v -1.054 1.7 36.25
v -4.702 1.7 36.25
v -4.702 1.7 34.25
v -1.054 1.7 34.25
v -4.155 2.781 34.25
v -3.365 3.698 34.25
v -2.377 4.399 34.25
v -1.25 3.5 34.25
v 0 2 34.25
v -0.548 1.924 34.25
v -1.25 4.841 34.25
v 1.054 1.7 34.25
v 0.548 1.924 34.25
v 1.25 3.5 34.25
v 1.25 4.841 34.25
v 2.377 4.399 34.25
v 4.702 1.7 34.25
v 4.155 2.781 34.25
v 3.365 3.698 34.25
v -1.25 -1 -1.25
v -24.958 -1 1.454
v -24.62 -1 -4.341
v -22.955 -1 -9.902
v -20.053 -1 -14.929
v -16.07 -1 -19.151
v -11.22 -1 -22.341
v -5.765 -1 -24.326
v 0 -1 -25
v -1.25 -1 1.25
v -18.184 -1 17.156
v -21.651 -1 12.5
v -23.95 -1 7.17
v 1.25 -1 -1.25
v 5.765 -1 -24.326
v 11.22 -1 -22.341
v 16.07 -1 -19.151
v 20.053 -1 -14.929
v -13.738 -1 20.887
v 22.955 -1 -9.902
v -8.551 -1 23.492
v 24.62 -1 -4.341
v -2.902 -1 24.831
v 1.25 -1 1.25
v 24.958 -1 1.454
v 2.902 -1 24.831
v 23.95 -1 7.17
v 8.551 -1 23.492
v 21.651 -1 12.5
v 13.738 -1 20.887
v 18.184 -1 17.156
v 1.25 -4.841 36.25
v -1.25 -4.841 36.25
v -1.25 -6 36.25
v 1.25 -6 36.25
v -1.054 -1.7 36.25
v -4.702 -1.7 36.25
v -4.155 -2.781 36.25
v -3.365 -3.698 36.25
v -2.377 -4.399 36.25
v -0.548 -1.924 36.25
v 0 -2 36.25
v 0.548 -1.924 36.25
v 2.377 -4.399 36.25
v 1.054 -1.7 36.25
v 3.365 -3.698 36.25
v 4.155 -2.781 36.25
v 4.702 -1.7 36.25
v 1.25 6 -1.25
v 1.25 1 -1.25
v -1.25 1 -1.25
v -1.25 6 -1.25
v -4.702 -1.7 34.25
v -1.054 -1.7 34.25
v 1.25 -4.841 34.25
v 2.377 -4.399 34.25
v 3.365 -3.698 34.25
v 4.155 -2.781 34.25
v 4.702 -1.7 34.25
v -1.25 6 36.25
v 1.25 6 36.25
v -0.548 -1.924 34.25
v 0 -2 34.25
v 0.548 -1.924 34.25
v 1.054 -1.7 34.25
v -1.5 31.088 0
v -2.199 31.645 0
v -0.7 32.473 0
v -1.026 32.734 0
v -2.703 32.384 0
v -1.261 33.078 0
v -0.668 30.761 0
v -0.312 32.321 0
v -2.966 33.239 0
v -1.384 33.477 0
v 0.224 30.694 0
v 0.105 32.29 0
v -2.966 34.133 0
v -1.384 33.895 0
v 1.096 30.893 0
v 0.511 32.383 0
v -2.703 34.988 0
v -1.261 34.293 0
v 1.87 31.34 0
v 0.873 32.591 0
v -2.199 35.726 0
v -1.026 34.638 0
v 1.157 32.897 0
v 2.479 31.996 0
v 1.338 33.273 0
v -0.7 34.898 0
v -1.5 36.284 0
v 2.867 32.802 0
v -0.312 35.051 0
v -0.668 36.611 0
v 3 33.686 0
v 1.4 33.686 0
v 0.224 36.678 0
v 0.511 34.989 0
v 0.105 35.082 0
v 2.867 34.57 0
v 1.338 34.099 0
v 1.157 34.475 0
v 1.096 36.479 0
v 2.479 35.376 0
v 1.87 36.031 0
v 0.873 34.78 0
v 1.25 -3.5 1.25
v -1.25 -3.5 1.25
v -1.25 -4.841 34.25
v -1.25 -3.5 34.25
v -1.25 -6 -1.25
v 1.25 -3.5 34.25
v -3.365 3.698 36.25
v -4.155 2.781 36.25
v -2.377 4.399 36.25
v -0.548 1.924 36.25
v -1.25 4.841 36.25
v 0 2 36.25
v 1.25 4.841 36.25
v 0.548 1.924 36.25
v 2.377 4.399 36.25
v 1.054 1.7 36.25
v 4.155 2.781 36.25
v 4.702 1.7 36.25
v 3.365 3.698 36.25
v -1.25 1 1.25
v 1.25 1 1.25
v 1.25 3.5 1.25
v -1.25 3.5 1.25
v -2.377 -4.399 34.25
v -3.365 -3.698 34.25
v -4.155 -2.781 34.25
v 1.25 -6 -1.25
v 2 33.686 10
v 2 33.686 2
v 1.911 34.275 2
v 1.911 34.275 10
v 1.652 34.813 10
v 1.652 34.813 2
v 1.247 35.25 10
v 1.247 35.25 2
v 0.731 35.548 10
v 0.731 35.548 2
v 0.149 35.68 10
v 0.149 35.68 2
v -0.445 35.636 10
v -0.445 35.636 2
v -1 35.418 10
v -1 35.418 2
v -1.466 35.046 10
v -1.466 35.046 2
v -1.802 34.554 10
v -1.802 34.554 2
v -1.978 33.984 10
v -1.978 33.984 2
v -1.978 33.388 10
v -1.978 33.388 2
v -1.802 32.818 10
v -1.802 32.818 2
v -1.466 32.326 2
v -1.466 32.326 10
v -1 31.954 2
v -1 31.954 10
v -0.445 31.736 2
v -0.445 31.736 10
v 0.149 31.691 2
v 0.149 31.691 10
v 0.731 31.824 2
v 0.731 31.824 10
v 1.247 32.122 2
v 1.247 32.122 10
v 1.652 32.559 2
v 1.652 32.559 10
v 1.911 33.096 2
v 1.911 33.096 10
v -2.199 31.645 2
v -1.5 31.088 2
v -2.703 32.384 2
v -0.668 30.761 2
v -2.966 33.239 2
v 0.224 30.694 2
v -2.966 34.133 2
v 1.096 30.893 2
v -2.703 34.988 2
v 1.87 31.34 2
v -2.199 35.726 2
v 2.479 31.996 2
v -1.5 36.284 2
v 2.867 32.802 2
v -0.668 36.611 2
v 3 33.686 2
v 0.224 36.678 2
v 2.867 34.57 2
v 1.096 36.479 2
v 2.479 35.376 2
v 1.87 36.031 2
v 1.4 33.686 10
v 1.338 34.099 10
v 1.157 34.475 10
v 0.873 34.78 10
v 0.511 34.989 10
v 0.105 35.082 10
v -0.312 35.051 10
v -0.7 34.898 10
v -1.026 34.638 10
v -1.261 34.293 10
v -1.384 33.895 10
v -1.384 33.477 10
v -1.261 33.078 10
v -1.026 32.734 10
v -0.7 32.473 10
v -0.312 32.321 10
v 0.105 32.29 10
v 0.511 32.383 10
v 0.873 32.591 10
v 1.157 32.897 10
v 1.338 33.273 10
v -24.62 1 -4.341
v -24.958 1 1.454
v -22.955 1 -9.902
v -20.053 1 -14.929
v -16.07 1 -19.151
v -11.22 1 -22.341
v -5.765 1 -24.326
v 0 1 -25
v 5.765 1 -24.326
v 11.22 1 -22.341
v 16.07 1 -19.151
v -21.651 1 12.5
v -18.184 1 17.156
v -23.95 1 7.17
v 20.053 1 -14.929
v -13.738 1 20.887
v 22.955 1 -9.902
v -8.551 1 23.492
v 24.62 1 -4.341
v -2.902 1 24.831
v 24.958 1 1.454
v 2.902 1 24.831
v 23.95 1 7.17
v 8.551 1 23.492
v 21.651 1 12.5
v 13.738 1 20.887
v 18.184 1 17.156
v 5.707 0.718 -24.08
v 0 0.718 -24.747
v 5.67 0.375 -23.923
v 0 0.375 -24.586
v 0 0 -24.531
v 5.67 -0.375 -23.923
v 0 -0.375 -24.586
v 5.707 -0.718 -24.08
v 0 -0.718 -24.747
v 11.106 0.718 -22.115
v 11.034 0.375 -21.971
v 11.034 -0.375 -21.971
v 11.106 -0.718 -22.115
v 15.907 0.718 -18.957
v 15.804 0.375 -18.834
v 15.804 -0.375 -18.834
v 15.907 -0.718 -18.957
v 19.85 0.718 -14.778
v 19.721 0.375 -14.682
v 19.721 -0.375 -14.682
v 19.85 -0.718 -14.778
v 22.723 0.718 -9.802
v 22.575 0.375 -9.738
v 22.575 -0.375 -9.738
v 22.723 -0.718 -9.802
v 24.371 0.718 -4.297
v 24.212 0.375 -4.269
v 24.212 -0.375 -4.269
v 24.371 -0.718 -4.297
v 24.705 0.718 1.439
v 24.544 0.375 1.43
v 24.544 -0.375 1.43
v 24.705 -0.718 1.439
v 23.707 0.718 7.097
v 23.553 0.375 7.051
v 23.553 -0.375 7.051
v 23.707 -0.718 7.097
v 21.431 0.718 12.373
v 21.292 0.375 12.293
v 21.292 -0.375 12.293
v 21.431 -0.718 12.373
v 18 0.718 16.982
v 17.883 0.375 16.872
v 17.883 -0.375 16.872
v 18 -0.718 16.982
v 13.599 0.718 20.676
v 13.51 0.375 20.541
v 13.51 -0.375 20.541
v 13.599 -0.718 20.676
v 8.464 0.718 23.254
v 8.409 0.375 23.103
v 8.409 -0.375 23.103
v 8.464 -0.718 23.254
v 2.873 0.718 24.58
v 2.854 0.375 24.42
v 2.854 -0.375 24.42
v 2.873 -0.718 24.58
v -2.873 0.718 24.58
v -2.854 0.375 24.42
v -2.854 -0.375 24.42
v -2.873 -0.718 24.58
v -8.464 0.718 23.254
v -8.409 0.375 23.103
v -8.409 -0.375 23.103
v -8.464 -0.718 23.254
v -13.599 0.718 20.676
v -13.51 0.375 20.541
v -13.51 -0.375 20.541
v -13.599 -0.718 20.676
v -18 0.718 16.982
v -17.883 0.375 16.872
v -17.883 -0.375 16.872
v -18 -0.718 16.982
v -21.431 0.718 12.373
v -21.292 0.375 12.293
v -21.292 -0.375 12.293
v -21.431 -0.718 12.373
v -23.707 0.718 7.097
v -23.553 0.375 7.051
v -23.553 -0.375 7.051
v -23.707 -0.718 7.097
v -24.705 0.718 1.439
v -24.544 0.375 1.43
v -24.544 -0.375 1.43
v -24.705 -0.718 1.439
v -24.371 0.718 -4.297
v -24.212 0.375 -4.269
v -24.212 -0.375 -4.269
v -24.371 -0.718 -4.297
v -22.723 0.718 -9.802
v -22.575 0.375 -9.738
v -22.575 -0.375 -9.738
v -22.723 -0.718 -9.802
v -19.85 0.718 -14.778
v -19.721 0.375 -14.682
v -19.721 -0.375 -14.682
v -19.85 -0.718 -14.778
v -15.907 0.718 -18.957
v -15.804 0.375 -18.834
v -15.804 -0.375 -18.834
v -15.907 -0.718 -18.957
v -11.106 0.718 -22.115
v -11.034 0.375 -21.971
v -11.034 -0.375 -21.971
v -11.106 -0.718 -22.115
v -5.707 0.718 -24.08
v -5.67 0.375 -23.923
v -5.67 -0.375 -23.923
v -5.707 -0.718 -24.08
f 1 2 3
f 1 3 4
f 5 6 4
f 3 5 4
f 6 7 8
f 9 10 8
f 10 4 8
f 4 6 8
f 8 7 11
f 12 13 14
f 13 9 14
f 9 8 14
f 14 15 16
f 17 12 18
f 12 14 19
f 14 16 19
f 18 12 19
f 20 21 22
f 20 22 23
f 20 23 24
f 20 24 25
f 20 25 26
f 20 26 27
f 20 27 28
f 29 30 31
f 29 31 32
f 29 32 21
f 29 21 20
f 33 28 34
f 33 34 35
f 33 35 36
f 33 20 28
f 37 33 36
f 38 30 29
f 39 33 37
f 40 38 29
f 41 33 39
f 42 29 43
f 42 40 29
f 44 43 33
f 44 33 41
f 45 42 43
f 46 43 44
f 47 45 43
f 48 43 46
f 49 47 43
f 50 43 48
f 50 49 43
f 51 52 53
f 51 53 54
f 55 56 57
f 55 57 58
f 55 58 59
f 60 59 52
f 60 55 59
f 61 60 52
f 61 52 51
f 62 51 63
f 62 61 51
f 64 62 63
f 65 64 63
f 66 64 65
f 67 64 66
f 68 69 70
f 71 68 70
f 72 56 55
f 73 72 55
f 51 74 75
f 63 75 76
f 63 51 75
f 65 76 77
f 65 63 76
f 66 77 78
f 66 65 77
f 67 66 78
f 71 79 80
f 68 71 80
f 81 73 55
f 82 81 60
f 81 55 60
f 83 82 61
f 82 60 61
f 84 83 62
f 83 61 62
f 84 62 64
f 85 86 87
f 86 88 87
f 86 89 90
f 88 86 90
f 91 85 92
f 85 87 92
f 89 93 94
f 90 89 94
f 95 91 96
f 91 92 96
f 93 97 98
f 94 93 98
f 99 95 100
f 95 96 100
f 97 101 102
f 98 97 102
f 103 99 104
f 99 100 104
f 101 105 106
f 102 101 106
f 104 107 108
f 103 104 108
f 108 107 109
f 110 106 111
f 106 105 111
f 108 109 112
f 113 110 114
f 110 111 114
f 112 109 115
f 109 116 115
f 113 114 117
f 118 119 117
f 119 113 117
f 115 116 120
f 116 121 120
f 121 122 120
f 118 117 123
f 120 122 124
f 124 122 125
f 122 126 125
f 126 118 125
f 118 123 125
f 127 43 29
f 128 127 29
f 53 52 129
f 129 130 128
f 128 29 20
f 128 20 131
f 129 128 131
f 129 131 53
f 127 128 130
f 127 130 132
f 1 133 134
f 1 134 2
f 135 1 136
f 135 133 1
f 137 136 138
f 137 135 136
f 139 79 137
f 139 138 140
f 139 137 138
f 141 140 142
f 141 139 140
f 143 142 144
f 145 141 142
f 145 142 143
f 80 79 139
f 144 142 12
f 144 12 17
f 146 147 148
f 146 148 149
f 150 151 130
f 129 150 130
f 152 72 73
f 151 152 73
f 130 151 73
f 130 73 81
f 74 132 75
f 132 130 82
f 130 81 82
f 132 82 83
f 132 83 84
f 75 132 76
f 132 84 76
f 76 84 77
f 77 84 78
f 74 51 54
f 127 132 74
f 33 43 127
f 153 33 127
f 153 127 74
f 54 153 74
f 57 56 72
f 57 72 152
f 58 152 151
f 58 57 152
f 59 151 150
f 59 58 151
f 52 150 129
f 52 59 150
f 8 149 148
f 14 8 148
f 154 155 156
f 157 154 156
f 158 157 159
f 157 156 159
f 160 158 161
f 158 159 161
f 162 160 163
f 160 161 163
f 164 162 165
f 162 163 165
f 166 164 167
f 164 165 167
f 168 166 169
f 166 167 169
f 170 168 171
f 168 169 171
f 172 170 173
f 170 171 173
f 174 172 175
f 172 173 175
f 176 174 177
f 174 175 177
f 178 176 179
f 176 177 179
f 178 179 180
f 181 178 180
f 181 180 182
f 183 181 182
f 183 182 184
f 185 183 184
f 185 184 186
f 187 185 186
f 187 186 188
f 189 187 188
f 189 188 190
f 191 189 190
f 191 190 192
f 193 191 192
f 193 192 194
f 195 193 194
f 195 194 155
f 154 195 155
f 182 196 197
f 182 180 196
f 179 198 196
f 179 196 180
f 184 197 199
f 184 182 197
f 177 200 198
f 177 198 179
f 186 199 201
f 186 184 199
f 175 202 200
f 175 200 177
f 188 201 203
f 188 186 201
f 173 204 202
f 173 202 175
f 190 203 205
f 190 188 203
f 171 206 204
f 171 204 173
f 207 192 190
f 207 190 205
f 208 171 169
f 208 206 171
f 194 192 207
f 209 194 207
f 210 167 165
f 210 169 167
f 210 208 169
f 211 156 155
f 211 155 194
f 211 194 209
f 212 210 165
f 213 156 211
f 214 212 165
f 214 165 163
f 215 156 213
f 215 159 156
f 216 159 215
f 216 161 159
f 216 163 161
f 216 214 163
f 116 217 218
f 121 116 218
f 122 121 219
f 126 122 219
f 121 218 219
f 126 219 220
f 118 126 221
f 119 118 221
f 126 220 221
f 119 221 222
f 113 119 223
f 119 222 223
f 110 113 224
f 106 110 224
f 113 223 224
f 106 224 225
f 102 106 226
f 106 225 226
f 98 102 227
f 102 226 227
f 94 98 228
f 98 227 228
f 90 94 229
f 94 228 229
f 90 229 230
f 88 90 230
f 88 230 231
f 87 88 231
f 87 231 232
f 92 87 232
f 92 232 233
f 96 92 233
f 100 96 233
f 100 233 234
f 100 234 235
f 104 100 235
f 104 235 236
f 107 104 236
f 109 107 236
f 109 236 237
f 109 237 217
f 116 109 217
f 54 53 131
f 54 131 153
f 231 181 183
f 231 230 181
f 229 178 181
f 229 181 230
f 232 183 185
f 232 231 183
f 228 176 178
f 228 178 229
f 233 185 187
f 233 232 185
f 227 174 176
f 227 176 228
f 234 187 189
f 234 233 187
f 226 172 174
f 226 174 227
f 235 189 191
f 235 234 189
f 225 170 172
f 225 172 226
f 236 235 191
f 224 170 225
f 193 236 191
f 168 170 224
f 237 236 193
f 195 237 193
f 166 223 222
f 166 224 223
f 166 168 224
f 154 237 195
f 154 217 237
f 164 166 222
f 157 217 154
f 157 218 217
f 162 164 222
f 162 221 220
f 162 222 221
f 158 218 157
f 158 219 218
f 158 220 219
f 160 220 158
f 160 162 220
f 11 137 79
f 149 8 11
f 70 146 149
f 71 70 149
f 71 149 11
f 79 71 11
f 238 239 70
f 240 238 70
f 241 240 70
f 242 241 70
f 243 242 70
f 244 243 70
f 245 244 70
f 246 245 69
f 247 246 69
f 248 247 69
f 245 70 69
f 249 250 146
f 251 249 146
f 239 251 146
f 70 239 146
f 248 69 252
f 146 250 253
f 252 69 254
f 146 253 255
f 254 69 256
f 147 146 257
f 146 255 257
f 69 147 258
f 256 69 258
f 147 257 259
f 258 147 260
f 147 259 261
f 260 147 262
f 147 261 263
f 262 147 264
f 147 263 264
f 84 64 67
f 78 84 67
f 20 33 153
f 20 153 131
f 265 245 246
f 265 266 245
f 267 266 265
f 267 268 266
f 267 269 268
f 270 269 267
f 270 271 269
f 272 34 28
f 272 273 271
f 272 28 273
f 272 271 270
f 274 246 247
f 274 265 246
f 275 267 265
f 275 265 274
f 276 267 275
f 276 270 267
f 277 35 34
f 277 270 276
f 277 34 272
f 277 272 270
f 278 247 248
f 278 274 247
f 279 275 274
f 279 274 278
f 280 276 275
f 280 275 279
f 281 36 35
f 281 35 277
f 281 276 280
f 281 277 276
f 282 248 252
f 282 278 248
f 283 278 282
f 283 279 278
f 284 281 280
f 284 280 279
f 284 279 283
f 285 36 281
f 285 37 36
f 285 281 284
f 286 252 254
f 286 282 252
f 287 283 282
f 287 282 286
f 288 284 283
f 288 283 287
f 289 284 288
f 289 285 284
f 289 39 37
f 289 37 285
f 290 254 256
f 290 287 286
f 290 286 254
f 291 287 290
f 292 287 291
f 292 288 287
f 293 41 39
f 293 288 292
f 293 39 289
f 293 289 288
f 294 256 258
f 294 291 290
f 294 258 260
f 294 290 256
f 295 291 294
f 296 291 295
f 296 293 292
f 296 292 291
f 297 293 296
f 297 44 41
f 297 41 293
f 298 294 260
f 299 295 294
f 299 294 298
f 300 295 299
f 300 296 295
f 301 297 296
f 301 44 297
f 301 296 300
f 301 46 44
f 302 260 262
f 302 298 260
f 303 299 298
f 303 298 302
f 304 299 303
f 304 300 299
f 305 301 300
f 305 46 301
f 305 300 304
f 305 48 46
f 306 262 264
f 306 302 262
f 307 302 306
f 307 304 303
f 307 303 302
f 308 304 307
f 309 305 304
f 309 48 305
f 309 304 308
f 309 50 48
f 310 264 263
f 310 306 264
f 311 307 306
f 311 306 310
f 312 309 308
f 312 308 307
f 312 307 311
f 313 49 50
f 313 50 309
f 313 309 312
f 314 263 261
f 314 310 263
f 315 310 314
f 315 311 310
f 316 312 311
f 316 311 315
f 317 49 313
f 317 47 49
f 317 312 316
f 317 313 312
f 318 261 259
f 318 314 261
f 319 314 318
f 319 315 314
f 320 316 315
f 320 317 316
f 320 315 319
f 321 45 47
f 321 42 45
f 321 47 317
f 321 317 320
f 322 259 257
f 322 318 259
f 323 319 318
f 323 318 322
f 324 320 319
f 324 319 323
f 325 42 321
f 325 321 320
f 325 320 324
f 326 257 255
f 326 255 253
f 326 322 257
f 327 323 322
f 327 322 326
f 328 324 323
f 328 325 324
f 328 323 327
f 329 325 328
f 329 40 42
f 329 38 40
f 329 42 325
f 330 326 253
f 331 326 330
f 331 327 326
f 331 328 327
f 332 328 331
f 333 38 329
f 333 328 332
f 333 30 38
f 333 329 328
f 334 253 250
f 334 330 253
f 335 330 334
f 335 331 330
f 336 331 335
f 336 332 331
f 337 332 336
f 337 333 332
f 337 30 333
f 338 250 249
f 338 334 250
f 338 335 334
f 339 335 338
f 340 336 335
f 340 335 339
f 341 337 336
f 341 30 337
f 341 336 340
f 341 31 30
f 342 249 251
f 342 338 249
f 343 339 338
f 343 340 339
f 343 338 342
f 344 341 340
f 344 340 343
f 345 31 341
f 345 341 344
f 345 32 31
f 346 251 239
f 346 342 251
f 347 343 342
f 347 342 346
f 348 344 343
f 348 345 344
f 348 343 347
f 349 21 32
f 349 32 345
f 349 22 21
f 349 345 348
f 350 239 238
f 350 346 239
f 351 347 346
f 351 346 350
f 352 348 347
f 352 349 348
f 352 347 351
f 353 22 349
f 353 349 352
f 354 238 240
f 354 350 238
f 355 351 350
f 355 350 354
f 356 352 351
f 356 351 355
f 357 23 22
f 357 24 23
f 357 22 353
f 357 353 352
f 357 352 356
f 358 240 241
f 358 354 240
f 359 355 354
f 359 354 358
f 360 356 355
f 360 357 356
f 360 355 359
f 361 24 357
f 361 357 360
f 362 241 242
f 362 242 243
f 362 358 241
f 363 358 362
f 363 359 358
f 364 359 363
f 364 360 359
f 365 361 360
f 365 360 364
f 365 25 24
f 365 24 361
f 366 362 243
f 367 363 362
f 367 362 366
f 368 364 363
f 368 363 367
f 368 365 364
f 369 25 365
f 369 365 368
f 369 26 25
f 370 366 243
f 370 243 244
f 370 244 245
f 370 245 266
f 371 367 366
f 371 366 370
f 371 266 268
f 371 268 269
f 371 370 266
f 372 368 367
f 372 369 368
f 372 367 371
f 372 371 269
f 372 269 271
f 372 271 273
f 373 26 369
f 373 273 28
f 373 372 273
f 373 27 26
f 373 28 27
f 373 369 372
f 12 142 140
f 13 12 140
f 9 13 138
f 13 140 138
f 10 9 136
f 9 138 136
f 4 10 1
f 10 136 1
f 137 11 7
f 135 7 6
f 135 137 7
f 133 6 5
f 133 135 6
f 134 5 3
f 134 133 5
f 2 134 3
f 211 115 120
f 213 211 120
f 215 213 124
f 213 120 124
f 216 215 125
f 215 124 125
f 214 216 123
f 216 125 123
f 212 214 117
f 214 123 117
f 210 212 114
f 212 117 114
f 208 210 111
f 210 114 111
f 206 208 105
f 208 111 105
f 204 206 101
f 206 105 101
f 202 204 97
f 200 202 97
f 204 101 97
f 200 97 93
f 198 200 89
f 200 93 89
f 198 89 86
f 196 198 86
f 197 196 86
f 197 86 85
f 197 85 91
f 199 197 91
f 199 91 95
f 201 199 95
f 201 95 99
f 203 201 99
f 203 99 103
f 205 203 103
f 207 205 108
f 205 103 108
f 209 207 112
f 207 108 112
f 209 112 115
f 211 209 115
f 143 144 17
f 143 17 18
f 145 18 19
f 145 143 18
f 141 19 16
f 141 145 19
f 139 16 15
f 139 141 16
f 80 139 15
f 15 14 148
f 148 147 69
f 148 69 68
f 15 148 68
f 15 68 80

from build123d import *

# Parameters (mm, degrees)
F0_R      = 25
F1_DEPTH  = 1
F4_W      = 2.5
F4_H      = 2.5
F5_DEPTH  = 5
F6_W      = 2.5
F6_H      = 2.5
F7_DEPTH  = 35
F9_R      = 5
F9_R_2    = 2
F10_DEPTH = 2
F11_R     = 2
F12_DEPTH = 10
F11_R_2   = 3
F13_DEPTH = 2
F14_R     = 1.4
F15_DEPTH = 35.001
F16_W     = 15
F16_H     = 3.4
F17_DEPTH = 5


with BuildPart() as f1:
    # F0 (on Front) → F1 (new body, symmetric)
    with BuildSketch(Plane.XZ):
        Circle(F0_R)
    extrude(amount=F1_DEPTH, both=True)

    # F2 (on Right) → F3 (revolve, cut)
    with BuildSketch(Plane.YZ):
        with BuildLine():
            Line((-1, -25), (1, -25))
            ThreePointArc((1, -25), (0, -24.530662), (-1, -25))
        make_face()
    revolve(axis=Axis((0, -0.215719, 0), (0, -1, 0)), mode=Mode.SUBTRACT)

    # F4 (on face) → F5 (join)
    with BuildSketch(Plane(origin=(0, 1, 0), x_dir=(-1, 0, 0), z_dir=(0, 1, 0))):
        Rectangle(F4_W, F4_H)
    extrude(amount=F5_DEPTH)

    # F6 (on face) → F7 (join)
    with BuildSketch(Plane.XY.offset(1.25)):
        with Locations((0, 4.75)):
            Rectangle(F6_W, F6_H)
    extrude(amount=F7_DEPTH)

    # F8: F1 across plane


with BuildPart() as f1_1:
    add(f1.part)
    add(f1.part.mirror(Plane.XZ))

    # F9 (on face) → F10 (join)
    with BuildSketch(Plane.XY.offset(36.25)):
        Circle(F9_R)
        Circle(F9_R_2, mode=Mode.SUBTRACT)
    extrude(amount=-F10_DEPTH)

    # F16 (on face) → F17 (cut)
    with BuildSketch(Plane.XY.offset(36.25)):
        Rectangle(F16_W, F16_H)
    extrude(amount=-F17_DEPTH, mode=Mode.SUBTRACT)


with BuildPart() as f12:
    # F11 (on Top) → F12 (new body)
    with BuildSketch(Plane.XY):
        with Locations((0, 33.685902)):
            Circle(F11_R)
    extrude(amount=F12_DEPTH)

    # F11 (on Top) → F13 (join)
    with BuildSketch(Plane.XY):
        with Locations((0, 33.685902)):
            Circle(F11_R_2)
        with Locations((0, 33.685902)):
            Circle(F11_R, mode=Mode.SUBTRACT)
    extrude(amount=F13_DEPTH)

    # F14 (on face) → F15 (cut, through all)
    with BuildSketch(Plane.XY.offset(10)):
        with Locations((0, 33.685902)):
            Circle(F14_R)
    extrude(amount=-F15_DEPTH, mode=Mode.SUBTRACT)


solid = Compound([f1_1.part, f12.part])
